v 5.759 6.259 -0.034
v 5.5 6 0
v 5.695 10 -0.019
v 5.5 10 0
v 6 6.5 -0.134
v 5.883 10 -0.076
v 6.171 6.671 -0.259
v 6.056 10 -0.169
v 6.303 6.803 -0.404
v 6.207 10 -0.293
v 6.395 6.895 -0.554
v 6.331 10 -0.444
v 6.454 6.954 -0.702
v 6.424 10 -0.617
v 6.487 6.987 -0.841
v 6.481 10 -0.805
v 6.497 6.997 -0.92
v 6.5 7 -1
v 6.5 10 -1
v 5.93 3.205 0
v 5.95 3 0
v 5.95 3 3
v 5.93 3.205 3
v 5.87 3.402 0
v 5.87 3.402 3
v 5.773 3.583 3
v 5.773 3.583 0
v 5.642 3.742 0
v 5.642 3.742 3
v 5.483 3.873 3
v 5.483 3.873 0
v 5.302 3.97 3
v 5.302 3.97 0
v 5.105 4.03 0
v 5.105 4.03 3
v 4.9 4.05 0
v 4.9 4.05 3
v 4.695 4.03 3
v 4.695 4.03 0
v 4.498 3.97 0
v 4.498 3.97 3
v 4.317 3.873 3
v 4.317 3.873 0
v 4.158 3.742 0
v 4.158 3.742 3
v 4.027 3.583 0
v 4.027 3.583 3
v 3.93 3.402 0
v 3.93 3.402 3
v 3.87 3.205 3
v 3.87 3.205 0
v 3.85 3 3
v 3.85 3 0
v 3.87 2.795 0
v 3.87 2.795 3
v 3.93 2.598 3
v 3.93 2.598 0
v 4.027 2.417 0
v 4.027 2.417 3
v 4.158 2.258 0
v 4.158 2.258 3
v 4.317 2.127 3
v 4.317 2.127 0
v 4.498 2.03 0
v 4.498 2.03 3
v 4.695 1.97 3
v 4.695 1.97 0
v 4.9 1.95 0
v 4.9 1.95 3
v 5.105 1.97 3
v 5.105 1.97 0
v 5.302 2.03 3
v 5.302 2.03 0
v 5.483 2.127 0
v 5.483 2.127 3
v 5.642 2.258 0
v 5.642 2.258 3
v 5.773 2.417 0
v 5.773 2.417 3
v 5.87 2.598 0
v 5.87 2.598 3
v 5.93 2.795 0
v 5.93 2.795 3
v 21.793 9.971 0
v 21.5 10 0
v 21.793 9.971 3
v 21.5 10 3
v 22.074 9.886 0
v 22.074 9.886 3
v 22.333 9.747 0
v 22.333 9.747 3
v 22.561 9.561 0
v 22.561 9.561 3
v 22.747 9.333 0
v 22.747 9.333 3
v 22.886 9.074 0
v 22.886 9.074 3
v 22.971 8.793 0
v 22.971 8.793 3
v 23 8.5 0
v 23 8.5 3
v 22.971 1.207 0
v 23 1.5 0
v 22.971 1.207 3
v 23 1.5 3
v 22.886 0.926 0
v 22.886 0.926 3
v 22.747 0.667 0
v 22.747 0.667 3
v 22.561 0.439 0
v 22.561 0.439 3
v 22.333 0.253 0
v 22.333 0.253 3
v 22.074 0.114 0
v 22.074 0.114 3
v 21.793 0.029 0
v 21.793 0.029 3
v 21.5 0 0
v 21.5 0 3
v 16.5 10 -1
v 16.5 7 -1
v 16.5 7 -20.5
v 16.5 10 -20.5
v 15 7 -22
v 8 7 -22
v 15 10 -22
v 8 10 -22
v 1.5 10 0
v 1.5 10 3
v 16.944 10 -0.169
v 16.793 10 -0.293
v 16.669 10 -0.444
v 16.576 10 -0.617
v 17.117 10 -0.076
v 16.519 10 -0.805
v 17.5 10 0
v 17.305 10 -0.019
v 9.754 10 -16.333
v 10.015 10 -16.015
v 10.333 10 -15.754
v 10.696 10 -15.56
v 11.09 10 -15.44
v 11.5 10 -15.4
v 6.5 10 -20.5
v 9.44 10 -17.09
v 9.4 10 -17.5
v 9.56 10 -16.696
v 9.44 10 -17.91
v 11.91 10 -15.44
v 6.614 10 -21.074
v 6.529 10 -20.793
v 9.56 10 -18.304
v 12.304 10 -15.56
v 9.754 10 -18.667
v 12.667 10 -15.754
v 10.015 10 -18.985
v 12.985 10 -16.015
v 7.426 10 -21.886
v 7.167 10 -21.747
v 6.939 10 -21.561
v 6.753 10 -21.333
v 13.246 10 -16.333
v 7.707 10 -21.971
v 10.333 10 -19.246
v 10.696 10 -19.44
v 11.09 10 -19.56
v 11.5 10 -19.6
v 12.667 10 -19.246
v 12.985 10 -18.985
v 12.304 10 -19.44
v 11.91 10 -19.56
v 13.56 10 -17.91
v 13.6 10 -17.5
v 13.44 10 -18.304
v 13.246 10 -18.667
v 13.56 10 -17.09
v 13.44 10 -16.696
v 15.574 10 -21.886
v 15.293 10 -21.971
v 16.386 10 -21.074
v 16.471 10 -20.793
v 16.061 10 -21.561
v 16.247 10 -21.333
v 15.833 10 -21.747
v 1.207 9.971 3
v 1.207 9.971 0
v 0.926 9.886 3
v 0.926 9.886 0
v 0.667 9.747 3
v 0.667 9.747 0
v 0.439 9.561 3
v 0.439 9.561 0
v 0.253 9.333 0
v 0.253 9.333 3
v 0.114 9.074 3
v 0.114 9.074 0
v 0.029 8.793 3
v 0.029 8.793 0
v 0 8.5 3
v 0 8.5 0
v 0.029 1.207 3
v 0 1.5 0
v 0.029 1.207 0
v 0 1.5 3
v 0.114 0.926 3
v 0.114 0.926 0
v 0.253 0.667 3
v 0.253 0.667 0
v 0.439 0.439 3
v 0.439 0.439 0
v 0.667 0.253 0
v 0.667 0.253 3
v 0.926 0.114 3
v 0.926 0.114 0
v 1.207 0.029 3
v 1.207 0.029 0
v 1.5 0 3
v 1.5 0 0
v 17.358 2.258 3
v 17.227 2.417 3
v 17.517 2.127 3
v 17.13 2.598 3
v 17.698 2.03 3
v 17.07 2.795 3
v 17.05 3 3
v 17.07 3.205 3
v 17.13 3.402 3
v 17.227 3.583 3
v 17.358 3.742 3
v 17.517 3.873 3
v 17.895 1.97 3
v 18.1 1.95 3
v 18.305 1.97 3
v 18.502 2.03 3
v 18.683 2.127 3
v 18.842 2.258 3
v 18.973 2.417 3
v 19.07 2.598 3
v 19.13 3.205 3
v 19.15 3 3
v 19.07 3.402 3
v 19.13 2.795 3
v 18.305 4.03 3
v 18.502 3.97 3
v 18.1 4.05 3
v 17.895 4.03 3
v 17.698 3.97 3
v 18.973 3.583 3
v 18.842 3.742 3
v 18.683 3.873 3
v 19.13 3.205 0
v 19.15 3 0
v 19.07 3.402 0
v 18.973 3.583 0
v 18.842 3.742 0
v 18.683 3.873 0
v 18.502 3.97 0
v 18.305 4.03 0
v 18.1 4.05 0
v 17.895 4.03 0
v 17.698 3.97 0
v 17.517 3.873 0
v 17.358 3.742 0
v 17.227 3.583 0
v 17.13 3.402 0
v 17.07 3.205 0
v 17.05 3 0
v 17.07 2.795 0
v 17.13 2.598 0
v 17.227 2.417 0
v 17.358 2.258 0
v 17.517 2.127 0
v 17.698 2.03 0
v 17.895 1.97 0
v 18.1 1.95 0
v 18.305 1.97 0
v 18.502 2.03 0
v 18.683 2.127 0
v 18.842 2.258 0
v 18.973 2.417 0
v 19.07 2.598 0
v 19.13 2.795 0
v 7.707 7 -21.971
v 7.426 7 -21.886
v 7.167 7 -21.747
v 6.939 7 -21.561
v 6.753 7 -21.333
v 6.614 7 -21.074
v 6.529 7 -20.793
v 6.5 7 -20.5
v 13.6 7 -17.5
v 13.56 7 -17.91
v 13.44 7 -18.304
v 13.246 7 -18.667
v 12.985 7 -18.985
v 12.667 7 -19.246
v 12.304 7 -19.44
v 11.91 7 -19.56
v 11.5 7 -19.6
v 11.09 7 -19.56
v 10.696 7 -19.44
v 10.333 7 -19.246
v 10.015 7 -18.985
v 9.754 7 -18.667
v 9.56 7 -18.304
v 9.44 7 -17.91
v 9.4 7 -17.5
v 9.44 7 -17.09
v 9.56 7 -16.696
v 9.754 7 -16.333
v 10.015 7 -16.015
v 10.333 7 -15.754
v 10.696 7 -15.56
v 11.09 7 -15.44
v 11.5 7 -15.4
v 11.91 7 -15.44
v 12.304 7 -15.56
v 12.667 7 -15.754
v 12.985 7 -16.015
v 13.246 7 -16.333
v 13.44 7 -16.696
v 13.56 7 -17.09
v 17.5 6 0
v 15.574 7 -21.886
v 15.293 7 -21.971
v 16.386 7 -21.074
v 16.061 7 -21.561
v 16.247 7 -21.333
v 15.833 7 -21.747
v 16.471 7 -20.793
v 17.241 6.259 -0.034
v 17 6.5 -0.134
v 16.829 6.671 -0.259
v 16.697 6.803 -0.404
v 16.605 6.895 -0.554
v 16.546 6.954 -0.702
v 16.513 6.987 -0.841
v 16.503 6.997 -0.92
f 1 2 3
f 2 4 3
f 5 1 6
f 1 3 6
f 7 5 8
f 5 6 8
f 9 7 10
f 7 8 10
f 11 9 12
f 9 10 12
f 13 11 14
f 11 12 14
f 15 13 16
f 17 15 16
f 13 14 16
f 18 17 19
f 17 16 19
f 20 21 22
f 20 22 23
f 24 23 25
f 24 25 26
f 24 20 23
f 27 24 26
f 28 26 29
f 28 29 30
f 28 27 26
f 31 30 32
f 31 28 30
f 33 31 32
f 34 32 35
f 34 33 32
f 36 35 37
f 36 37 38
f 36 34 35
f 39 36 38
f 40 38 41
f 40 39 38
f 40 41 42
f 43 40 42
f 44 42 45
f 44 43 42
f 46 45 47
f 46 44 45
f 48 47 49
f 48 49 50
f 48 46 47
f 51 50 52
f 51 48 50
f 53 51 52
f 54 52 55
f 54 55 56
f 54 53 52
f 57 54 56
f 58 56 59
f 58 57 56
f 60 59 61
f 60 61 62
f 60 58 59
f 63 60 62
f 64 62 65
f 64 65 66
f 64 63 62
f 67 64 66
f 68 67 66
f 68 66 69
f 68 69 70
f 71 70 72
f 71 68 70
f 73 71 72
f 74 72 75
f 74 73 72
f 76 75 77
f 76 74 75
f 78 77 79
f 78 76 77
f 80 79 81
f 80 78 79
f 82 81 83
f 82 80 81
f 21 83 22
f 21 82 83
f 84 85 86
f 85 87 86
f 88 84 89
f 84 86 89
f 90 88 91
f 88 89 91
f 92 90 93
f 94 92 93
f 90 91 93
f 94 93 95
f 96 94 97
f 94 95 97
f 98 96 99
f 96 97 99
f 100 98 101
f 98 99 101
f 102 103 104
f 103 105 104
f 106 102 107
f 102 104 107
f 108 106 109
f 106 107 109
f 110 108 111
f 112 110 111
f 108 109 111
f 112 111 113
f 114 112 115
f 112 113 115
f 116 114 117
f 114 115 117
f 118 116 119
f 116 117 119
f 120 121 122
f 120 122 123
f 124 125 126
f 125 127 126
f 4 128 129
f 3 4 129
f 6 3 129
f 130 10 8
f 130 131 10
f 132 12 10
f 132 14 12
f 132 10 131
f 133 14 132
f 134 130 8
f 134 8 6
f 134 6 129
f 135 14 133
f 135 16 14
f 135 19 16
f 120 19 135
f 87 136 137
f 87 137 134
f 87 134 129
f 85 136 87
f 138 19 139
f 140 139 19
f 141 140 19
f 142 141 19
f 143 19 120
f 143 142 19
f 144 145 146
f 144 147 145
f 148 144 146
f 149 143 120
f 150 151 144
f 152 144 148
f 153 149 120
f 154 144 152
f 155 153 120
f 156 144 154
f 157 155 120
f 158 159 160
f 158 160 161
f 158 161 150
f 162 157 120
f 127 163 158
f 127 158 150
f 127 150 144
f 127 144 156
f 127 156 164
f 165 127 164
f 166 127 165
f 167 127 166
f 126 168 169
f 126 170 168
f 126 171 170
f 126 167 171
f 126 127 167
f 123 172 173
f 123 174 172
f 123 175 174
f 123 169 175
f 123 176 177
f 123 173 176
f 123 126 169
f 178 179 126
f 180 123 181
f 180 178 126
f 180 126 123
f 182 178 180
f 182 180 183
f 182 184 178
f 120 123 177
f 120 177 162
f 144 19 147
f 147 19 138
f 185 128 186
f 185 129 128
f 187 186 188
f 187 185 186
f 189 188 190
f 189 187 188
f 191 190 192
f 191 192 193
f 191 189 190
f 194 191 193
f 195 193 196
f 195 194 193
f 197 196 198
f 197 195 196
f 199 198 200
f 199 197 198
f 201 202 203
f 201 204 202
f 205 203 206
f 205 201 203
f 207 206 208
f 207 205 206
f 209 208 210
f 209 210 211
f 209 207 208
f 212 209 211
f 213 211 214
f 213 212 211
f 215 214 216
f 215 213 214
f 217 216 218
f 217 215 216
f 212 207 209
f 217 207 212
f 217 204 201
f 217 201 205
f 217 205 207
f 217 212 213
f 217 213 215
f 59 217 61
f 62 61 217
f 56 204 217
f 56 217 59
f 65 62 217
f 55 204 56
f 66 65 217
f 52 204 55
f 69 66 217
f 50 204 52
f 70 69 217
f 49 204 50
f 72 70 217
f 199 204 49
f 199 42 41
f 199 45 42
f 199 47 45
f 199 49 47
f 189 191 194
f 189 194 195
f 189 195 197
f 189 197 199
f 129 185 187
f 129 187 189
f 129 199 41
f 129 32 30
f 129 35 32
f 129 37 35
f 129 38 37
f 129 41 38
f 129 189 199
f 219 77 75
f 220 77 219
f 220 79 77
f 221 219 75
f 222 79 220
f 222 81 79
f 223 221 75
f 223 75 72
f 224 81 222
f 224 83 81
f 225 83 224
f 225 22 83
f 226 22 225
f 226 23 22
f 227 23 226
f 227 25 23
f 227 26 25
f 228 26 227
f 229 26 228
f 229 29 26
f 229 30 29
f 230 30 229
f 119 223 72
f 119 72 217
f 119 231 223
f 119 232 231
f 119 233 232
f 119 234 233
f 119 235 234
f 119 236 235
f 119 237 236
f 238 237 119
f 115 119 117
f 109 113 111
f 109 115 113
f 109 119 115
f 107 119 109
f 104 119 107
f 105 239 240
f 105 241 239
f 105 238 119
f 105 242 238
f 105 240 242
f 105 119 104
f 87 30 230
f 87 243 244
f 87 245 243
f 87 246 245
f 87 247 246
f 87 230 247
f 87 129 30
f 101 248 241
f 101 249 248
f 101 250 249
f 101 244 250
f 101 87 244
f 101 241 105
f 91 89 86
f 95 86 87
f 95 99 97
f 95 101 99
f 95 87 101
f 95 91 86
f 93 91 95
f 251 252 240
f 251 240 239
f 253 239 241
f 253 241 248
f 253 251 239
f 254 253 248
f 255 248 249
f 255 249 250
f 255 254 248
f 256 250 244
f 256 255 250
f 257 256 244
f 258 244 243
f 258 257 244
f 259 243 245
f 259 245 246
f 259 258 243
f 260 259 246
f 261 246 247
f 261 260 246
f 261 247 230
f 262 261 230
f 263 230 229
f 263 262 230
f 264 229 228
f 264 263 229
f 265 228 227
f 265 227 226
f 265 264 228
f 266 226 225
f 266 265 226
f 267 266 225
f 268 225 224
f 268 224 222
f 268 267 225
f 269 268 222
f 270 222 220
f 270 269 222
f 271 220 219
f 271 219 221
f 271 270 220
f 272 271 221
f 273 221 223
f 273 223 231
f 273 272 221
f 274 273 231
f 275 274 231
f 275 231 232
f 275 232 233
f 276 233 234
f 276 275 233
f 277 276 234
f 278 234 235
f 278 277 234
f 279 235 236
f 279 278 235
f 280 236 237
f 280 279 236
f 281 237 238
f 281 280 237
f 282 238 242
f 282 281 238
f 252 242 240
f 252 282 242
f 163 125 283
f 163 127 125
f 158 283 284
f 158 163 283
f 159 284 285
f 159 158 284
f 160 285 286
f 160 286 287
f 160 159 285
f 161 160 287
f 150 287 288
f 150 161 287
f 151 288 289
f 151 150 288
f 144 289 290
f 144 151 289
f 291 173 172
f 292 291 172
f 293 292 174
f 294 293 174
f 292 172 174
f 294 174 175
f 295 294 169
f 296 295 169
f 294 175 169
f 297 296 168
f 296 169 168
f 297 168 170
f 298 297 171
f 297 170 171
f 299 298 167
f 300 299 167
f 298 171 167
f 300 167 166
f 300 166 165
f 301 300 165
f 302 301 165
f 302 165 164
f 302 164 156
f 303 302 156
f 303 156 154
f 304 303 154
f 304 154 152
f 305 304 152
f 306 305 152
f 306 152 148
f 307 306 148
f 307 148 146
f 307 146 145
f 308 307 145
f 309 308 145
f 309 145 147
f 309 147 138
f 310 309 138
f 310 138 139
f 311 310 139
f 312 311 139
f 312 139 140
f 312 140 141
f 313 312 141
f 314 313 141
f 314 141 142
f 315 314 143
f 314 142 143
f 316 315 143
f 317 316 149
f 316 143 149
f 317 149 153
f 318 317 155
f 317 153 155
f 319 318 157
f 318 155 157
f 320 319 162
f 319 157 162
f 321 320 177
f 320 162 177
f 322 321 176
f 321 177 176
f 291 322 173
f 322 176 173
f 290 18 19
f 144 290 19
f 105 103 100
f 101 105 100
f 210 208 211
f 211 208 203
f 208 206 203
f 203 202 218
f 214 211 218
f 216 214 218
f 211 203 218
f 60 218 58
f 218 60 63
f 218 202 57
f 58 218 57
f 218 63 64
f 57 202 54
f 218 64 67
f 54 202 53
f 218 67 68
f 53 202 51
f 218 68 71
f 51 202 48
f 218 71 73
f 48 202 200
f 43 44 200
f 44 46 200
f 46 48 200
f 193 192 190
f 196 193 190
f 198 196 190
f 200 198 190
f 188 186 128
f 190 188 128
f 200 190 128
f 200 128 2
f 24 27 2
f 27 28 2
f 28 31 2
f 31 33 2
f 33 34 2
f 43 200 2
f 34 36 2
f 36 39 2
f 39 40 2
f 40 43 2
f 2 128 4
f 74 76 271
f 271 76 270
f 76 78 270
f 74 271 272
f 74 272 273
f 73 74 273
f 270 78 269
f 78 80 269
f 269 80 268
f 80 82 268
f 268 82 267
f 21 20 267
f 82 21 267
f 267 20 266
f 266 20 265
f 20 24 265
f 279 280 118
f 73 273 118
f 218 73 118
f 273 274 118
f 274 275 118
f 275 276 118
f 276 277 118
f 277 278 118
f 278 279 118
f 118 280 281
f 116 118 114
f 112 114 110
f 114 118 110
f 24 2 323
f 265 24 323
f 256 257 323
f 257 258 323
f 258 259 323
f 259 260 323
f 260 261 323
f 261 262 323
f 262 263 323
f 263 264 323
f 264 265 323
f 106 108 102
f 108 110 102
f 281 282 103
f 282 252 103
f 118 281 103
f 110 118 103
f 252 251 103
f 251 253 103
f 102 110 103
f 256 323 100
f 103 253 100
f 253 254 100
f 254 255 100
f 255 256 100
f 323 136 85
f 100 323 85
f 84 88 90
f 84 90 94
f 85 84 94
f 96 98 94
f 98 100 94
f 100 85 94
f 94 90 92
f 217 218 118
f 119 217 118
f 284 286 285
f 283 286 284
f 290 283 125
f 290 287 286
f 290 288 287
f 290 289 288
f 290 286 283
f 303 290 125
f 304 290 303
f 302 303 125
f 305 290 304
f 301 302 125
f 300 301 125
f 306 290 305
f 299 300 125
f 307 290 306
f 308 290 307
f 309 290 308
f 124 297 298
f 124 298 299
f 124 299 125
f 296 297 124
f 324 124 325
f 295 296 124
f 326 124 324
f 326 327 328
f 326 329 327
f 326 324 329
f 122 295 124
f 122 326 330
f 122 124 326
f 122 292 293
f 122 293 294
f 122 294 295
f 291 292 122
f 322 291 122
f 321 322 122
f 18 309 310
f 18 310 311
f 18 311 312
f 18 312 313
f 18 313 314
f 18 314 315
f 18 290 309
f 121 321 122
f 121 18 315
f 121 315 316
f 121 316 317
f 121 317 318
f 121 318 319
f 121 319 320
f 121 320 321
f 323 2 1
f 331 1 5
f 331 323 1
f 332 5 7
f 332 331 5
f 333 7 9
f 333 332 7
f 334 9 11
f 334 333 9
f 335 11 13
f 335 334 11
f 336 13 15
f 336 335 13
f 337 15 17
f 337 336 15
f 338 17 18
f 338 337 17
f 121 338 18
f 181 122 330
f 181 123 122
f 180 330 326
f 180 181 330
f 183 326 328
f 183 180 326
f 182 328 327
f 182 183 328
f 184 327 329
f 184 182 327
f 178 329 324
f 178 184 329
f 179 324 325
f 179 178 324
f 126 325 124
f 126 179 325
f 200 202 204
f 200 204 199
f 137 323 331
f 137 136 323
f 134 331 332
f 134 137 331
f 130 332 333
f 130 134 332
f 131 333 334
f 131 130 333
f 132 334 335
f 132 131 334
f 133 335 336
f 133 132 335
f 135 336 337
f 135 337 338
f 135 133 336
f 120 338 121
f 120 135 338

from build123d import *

# Parameters (mm, degrees)
SKETCH2_W           = 23
SKETCH2_H           = 10
SKETCH2_R           = 1.05
BOSS_EXTRUDE1_DEPTH = 3
SKETCH3_W           = 10
SKETCH3_H           = 3
BOSS_EXTRUDE2_DEPTH = 25
SKETCH4_R           = 2.1
CUT_EXTRUDE1_DEPTH  = 11
FILLET1_R           = 1.5
FILLET2_R           = 1


with BuildPart() as part:
    # Sketch2 → Boss-Extrude1 (new body)
    with BuildSketch(Plane.XY):
        with Locations((11.5, 5)):
            Rectangle(SKETCH2_W, SKETCH2_H)
        with Locations((4.9, 3)):
            Circle(SKETCH2_R, mode=Mode.SUBTRACT)
        with Locations((18.1, 3)):
            Circle(SKETCH2_R, mode=Mode.SUBTRACT)
    extrude(amount=BOSS_EXTRUDE1_DEPTH)

    # Sketch3 → Boss-Extrude2 (add)
    with BuildSketch(Plane.XY.offset(3)):
        with Locations((11.5, 8.5)):
            Rectangle(SKETCH3_W, SKETCH3_H)
    extrude(amount=-BOSS_EXTRUDE2_DEPTH)

    # Sketch4 → Cut-Extrude1 (cut, through all)
    with BuildSketch(Plane(origin=(0, 10, 0), x_dir=(1, 0, 0), z_dir=(0, 1, 0))):
        with Locations((11.5, 17.5)):
            Circle(SKETCH4_R)
    extrude(amount=-CUT_EXTRUDE1_DEPTH, mode=Mode.SUBTRACT)

    # Fillet1
    fillet1_edges = [part.edges().sort_by_distance(p)[0] for p in [
        (6.5, 8.5, -22),
        (16.5, 8.5, -22),
        (0, 10, 1.5),
        (23, 10, 1.5),
        (23, 0, 1.5),
        (0, 0, 1.5),
    ]]
    fillet(fillet1_edges, radius=FILLET1_R)

    # Fillet2
    fillet2_edges = [part.edges().sort_by_distance(p)[0] for p in [
        (11.5, 7, 0),
        (6.5, 8.5, 0),
        (16.5, 8.5, 0),
    ]]
    fillet(fillet2_edges, radius=FILLET2_R)


solid = part.part
